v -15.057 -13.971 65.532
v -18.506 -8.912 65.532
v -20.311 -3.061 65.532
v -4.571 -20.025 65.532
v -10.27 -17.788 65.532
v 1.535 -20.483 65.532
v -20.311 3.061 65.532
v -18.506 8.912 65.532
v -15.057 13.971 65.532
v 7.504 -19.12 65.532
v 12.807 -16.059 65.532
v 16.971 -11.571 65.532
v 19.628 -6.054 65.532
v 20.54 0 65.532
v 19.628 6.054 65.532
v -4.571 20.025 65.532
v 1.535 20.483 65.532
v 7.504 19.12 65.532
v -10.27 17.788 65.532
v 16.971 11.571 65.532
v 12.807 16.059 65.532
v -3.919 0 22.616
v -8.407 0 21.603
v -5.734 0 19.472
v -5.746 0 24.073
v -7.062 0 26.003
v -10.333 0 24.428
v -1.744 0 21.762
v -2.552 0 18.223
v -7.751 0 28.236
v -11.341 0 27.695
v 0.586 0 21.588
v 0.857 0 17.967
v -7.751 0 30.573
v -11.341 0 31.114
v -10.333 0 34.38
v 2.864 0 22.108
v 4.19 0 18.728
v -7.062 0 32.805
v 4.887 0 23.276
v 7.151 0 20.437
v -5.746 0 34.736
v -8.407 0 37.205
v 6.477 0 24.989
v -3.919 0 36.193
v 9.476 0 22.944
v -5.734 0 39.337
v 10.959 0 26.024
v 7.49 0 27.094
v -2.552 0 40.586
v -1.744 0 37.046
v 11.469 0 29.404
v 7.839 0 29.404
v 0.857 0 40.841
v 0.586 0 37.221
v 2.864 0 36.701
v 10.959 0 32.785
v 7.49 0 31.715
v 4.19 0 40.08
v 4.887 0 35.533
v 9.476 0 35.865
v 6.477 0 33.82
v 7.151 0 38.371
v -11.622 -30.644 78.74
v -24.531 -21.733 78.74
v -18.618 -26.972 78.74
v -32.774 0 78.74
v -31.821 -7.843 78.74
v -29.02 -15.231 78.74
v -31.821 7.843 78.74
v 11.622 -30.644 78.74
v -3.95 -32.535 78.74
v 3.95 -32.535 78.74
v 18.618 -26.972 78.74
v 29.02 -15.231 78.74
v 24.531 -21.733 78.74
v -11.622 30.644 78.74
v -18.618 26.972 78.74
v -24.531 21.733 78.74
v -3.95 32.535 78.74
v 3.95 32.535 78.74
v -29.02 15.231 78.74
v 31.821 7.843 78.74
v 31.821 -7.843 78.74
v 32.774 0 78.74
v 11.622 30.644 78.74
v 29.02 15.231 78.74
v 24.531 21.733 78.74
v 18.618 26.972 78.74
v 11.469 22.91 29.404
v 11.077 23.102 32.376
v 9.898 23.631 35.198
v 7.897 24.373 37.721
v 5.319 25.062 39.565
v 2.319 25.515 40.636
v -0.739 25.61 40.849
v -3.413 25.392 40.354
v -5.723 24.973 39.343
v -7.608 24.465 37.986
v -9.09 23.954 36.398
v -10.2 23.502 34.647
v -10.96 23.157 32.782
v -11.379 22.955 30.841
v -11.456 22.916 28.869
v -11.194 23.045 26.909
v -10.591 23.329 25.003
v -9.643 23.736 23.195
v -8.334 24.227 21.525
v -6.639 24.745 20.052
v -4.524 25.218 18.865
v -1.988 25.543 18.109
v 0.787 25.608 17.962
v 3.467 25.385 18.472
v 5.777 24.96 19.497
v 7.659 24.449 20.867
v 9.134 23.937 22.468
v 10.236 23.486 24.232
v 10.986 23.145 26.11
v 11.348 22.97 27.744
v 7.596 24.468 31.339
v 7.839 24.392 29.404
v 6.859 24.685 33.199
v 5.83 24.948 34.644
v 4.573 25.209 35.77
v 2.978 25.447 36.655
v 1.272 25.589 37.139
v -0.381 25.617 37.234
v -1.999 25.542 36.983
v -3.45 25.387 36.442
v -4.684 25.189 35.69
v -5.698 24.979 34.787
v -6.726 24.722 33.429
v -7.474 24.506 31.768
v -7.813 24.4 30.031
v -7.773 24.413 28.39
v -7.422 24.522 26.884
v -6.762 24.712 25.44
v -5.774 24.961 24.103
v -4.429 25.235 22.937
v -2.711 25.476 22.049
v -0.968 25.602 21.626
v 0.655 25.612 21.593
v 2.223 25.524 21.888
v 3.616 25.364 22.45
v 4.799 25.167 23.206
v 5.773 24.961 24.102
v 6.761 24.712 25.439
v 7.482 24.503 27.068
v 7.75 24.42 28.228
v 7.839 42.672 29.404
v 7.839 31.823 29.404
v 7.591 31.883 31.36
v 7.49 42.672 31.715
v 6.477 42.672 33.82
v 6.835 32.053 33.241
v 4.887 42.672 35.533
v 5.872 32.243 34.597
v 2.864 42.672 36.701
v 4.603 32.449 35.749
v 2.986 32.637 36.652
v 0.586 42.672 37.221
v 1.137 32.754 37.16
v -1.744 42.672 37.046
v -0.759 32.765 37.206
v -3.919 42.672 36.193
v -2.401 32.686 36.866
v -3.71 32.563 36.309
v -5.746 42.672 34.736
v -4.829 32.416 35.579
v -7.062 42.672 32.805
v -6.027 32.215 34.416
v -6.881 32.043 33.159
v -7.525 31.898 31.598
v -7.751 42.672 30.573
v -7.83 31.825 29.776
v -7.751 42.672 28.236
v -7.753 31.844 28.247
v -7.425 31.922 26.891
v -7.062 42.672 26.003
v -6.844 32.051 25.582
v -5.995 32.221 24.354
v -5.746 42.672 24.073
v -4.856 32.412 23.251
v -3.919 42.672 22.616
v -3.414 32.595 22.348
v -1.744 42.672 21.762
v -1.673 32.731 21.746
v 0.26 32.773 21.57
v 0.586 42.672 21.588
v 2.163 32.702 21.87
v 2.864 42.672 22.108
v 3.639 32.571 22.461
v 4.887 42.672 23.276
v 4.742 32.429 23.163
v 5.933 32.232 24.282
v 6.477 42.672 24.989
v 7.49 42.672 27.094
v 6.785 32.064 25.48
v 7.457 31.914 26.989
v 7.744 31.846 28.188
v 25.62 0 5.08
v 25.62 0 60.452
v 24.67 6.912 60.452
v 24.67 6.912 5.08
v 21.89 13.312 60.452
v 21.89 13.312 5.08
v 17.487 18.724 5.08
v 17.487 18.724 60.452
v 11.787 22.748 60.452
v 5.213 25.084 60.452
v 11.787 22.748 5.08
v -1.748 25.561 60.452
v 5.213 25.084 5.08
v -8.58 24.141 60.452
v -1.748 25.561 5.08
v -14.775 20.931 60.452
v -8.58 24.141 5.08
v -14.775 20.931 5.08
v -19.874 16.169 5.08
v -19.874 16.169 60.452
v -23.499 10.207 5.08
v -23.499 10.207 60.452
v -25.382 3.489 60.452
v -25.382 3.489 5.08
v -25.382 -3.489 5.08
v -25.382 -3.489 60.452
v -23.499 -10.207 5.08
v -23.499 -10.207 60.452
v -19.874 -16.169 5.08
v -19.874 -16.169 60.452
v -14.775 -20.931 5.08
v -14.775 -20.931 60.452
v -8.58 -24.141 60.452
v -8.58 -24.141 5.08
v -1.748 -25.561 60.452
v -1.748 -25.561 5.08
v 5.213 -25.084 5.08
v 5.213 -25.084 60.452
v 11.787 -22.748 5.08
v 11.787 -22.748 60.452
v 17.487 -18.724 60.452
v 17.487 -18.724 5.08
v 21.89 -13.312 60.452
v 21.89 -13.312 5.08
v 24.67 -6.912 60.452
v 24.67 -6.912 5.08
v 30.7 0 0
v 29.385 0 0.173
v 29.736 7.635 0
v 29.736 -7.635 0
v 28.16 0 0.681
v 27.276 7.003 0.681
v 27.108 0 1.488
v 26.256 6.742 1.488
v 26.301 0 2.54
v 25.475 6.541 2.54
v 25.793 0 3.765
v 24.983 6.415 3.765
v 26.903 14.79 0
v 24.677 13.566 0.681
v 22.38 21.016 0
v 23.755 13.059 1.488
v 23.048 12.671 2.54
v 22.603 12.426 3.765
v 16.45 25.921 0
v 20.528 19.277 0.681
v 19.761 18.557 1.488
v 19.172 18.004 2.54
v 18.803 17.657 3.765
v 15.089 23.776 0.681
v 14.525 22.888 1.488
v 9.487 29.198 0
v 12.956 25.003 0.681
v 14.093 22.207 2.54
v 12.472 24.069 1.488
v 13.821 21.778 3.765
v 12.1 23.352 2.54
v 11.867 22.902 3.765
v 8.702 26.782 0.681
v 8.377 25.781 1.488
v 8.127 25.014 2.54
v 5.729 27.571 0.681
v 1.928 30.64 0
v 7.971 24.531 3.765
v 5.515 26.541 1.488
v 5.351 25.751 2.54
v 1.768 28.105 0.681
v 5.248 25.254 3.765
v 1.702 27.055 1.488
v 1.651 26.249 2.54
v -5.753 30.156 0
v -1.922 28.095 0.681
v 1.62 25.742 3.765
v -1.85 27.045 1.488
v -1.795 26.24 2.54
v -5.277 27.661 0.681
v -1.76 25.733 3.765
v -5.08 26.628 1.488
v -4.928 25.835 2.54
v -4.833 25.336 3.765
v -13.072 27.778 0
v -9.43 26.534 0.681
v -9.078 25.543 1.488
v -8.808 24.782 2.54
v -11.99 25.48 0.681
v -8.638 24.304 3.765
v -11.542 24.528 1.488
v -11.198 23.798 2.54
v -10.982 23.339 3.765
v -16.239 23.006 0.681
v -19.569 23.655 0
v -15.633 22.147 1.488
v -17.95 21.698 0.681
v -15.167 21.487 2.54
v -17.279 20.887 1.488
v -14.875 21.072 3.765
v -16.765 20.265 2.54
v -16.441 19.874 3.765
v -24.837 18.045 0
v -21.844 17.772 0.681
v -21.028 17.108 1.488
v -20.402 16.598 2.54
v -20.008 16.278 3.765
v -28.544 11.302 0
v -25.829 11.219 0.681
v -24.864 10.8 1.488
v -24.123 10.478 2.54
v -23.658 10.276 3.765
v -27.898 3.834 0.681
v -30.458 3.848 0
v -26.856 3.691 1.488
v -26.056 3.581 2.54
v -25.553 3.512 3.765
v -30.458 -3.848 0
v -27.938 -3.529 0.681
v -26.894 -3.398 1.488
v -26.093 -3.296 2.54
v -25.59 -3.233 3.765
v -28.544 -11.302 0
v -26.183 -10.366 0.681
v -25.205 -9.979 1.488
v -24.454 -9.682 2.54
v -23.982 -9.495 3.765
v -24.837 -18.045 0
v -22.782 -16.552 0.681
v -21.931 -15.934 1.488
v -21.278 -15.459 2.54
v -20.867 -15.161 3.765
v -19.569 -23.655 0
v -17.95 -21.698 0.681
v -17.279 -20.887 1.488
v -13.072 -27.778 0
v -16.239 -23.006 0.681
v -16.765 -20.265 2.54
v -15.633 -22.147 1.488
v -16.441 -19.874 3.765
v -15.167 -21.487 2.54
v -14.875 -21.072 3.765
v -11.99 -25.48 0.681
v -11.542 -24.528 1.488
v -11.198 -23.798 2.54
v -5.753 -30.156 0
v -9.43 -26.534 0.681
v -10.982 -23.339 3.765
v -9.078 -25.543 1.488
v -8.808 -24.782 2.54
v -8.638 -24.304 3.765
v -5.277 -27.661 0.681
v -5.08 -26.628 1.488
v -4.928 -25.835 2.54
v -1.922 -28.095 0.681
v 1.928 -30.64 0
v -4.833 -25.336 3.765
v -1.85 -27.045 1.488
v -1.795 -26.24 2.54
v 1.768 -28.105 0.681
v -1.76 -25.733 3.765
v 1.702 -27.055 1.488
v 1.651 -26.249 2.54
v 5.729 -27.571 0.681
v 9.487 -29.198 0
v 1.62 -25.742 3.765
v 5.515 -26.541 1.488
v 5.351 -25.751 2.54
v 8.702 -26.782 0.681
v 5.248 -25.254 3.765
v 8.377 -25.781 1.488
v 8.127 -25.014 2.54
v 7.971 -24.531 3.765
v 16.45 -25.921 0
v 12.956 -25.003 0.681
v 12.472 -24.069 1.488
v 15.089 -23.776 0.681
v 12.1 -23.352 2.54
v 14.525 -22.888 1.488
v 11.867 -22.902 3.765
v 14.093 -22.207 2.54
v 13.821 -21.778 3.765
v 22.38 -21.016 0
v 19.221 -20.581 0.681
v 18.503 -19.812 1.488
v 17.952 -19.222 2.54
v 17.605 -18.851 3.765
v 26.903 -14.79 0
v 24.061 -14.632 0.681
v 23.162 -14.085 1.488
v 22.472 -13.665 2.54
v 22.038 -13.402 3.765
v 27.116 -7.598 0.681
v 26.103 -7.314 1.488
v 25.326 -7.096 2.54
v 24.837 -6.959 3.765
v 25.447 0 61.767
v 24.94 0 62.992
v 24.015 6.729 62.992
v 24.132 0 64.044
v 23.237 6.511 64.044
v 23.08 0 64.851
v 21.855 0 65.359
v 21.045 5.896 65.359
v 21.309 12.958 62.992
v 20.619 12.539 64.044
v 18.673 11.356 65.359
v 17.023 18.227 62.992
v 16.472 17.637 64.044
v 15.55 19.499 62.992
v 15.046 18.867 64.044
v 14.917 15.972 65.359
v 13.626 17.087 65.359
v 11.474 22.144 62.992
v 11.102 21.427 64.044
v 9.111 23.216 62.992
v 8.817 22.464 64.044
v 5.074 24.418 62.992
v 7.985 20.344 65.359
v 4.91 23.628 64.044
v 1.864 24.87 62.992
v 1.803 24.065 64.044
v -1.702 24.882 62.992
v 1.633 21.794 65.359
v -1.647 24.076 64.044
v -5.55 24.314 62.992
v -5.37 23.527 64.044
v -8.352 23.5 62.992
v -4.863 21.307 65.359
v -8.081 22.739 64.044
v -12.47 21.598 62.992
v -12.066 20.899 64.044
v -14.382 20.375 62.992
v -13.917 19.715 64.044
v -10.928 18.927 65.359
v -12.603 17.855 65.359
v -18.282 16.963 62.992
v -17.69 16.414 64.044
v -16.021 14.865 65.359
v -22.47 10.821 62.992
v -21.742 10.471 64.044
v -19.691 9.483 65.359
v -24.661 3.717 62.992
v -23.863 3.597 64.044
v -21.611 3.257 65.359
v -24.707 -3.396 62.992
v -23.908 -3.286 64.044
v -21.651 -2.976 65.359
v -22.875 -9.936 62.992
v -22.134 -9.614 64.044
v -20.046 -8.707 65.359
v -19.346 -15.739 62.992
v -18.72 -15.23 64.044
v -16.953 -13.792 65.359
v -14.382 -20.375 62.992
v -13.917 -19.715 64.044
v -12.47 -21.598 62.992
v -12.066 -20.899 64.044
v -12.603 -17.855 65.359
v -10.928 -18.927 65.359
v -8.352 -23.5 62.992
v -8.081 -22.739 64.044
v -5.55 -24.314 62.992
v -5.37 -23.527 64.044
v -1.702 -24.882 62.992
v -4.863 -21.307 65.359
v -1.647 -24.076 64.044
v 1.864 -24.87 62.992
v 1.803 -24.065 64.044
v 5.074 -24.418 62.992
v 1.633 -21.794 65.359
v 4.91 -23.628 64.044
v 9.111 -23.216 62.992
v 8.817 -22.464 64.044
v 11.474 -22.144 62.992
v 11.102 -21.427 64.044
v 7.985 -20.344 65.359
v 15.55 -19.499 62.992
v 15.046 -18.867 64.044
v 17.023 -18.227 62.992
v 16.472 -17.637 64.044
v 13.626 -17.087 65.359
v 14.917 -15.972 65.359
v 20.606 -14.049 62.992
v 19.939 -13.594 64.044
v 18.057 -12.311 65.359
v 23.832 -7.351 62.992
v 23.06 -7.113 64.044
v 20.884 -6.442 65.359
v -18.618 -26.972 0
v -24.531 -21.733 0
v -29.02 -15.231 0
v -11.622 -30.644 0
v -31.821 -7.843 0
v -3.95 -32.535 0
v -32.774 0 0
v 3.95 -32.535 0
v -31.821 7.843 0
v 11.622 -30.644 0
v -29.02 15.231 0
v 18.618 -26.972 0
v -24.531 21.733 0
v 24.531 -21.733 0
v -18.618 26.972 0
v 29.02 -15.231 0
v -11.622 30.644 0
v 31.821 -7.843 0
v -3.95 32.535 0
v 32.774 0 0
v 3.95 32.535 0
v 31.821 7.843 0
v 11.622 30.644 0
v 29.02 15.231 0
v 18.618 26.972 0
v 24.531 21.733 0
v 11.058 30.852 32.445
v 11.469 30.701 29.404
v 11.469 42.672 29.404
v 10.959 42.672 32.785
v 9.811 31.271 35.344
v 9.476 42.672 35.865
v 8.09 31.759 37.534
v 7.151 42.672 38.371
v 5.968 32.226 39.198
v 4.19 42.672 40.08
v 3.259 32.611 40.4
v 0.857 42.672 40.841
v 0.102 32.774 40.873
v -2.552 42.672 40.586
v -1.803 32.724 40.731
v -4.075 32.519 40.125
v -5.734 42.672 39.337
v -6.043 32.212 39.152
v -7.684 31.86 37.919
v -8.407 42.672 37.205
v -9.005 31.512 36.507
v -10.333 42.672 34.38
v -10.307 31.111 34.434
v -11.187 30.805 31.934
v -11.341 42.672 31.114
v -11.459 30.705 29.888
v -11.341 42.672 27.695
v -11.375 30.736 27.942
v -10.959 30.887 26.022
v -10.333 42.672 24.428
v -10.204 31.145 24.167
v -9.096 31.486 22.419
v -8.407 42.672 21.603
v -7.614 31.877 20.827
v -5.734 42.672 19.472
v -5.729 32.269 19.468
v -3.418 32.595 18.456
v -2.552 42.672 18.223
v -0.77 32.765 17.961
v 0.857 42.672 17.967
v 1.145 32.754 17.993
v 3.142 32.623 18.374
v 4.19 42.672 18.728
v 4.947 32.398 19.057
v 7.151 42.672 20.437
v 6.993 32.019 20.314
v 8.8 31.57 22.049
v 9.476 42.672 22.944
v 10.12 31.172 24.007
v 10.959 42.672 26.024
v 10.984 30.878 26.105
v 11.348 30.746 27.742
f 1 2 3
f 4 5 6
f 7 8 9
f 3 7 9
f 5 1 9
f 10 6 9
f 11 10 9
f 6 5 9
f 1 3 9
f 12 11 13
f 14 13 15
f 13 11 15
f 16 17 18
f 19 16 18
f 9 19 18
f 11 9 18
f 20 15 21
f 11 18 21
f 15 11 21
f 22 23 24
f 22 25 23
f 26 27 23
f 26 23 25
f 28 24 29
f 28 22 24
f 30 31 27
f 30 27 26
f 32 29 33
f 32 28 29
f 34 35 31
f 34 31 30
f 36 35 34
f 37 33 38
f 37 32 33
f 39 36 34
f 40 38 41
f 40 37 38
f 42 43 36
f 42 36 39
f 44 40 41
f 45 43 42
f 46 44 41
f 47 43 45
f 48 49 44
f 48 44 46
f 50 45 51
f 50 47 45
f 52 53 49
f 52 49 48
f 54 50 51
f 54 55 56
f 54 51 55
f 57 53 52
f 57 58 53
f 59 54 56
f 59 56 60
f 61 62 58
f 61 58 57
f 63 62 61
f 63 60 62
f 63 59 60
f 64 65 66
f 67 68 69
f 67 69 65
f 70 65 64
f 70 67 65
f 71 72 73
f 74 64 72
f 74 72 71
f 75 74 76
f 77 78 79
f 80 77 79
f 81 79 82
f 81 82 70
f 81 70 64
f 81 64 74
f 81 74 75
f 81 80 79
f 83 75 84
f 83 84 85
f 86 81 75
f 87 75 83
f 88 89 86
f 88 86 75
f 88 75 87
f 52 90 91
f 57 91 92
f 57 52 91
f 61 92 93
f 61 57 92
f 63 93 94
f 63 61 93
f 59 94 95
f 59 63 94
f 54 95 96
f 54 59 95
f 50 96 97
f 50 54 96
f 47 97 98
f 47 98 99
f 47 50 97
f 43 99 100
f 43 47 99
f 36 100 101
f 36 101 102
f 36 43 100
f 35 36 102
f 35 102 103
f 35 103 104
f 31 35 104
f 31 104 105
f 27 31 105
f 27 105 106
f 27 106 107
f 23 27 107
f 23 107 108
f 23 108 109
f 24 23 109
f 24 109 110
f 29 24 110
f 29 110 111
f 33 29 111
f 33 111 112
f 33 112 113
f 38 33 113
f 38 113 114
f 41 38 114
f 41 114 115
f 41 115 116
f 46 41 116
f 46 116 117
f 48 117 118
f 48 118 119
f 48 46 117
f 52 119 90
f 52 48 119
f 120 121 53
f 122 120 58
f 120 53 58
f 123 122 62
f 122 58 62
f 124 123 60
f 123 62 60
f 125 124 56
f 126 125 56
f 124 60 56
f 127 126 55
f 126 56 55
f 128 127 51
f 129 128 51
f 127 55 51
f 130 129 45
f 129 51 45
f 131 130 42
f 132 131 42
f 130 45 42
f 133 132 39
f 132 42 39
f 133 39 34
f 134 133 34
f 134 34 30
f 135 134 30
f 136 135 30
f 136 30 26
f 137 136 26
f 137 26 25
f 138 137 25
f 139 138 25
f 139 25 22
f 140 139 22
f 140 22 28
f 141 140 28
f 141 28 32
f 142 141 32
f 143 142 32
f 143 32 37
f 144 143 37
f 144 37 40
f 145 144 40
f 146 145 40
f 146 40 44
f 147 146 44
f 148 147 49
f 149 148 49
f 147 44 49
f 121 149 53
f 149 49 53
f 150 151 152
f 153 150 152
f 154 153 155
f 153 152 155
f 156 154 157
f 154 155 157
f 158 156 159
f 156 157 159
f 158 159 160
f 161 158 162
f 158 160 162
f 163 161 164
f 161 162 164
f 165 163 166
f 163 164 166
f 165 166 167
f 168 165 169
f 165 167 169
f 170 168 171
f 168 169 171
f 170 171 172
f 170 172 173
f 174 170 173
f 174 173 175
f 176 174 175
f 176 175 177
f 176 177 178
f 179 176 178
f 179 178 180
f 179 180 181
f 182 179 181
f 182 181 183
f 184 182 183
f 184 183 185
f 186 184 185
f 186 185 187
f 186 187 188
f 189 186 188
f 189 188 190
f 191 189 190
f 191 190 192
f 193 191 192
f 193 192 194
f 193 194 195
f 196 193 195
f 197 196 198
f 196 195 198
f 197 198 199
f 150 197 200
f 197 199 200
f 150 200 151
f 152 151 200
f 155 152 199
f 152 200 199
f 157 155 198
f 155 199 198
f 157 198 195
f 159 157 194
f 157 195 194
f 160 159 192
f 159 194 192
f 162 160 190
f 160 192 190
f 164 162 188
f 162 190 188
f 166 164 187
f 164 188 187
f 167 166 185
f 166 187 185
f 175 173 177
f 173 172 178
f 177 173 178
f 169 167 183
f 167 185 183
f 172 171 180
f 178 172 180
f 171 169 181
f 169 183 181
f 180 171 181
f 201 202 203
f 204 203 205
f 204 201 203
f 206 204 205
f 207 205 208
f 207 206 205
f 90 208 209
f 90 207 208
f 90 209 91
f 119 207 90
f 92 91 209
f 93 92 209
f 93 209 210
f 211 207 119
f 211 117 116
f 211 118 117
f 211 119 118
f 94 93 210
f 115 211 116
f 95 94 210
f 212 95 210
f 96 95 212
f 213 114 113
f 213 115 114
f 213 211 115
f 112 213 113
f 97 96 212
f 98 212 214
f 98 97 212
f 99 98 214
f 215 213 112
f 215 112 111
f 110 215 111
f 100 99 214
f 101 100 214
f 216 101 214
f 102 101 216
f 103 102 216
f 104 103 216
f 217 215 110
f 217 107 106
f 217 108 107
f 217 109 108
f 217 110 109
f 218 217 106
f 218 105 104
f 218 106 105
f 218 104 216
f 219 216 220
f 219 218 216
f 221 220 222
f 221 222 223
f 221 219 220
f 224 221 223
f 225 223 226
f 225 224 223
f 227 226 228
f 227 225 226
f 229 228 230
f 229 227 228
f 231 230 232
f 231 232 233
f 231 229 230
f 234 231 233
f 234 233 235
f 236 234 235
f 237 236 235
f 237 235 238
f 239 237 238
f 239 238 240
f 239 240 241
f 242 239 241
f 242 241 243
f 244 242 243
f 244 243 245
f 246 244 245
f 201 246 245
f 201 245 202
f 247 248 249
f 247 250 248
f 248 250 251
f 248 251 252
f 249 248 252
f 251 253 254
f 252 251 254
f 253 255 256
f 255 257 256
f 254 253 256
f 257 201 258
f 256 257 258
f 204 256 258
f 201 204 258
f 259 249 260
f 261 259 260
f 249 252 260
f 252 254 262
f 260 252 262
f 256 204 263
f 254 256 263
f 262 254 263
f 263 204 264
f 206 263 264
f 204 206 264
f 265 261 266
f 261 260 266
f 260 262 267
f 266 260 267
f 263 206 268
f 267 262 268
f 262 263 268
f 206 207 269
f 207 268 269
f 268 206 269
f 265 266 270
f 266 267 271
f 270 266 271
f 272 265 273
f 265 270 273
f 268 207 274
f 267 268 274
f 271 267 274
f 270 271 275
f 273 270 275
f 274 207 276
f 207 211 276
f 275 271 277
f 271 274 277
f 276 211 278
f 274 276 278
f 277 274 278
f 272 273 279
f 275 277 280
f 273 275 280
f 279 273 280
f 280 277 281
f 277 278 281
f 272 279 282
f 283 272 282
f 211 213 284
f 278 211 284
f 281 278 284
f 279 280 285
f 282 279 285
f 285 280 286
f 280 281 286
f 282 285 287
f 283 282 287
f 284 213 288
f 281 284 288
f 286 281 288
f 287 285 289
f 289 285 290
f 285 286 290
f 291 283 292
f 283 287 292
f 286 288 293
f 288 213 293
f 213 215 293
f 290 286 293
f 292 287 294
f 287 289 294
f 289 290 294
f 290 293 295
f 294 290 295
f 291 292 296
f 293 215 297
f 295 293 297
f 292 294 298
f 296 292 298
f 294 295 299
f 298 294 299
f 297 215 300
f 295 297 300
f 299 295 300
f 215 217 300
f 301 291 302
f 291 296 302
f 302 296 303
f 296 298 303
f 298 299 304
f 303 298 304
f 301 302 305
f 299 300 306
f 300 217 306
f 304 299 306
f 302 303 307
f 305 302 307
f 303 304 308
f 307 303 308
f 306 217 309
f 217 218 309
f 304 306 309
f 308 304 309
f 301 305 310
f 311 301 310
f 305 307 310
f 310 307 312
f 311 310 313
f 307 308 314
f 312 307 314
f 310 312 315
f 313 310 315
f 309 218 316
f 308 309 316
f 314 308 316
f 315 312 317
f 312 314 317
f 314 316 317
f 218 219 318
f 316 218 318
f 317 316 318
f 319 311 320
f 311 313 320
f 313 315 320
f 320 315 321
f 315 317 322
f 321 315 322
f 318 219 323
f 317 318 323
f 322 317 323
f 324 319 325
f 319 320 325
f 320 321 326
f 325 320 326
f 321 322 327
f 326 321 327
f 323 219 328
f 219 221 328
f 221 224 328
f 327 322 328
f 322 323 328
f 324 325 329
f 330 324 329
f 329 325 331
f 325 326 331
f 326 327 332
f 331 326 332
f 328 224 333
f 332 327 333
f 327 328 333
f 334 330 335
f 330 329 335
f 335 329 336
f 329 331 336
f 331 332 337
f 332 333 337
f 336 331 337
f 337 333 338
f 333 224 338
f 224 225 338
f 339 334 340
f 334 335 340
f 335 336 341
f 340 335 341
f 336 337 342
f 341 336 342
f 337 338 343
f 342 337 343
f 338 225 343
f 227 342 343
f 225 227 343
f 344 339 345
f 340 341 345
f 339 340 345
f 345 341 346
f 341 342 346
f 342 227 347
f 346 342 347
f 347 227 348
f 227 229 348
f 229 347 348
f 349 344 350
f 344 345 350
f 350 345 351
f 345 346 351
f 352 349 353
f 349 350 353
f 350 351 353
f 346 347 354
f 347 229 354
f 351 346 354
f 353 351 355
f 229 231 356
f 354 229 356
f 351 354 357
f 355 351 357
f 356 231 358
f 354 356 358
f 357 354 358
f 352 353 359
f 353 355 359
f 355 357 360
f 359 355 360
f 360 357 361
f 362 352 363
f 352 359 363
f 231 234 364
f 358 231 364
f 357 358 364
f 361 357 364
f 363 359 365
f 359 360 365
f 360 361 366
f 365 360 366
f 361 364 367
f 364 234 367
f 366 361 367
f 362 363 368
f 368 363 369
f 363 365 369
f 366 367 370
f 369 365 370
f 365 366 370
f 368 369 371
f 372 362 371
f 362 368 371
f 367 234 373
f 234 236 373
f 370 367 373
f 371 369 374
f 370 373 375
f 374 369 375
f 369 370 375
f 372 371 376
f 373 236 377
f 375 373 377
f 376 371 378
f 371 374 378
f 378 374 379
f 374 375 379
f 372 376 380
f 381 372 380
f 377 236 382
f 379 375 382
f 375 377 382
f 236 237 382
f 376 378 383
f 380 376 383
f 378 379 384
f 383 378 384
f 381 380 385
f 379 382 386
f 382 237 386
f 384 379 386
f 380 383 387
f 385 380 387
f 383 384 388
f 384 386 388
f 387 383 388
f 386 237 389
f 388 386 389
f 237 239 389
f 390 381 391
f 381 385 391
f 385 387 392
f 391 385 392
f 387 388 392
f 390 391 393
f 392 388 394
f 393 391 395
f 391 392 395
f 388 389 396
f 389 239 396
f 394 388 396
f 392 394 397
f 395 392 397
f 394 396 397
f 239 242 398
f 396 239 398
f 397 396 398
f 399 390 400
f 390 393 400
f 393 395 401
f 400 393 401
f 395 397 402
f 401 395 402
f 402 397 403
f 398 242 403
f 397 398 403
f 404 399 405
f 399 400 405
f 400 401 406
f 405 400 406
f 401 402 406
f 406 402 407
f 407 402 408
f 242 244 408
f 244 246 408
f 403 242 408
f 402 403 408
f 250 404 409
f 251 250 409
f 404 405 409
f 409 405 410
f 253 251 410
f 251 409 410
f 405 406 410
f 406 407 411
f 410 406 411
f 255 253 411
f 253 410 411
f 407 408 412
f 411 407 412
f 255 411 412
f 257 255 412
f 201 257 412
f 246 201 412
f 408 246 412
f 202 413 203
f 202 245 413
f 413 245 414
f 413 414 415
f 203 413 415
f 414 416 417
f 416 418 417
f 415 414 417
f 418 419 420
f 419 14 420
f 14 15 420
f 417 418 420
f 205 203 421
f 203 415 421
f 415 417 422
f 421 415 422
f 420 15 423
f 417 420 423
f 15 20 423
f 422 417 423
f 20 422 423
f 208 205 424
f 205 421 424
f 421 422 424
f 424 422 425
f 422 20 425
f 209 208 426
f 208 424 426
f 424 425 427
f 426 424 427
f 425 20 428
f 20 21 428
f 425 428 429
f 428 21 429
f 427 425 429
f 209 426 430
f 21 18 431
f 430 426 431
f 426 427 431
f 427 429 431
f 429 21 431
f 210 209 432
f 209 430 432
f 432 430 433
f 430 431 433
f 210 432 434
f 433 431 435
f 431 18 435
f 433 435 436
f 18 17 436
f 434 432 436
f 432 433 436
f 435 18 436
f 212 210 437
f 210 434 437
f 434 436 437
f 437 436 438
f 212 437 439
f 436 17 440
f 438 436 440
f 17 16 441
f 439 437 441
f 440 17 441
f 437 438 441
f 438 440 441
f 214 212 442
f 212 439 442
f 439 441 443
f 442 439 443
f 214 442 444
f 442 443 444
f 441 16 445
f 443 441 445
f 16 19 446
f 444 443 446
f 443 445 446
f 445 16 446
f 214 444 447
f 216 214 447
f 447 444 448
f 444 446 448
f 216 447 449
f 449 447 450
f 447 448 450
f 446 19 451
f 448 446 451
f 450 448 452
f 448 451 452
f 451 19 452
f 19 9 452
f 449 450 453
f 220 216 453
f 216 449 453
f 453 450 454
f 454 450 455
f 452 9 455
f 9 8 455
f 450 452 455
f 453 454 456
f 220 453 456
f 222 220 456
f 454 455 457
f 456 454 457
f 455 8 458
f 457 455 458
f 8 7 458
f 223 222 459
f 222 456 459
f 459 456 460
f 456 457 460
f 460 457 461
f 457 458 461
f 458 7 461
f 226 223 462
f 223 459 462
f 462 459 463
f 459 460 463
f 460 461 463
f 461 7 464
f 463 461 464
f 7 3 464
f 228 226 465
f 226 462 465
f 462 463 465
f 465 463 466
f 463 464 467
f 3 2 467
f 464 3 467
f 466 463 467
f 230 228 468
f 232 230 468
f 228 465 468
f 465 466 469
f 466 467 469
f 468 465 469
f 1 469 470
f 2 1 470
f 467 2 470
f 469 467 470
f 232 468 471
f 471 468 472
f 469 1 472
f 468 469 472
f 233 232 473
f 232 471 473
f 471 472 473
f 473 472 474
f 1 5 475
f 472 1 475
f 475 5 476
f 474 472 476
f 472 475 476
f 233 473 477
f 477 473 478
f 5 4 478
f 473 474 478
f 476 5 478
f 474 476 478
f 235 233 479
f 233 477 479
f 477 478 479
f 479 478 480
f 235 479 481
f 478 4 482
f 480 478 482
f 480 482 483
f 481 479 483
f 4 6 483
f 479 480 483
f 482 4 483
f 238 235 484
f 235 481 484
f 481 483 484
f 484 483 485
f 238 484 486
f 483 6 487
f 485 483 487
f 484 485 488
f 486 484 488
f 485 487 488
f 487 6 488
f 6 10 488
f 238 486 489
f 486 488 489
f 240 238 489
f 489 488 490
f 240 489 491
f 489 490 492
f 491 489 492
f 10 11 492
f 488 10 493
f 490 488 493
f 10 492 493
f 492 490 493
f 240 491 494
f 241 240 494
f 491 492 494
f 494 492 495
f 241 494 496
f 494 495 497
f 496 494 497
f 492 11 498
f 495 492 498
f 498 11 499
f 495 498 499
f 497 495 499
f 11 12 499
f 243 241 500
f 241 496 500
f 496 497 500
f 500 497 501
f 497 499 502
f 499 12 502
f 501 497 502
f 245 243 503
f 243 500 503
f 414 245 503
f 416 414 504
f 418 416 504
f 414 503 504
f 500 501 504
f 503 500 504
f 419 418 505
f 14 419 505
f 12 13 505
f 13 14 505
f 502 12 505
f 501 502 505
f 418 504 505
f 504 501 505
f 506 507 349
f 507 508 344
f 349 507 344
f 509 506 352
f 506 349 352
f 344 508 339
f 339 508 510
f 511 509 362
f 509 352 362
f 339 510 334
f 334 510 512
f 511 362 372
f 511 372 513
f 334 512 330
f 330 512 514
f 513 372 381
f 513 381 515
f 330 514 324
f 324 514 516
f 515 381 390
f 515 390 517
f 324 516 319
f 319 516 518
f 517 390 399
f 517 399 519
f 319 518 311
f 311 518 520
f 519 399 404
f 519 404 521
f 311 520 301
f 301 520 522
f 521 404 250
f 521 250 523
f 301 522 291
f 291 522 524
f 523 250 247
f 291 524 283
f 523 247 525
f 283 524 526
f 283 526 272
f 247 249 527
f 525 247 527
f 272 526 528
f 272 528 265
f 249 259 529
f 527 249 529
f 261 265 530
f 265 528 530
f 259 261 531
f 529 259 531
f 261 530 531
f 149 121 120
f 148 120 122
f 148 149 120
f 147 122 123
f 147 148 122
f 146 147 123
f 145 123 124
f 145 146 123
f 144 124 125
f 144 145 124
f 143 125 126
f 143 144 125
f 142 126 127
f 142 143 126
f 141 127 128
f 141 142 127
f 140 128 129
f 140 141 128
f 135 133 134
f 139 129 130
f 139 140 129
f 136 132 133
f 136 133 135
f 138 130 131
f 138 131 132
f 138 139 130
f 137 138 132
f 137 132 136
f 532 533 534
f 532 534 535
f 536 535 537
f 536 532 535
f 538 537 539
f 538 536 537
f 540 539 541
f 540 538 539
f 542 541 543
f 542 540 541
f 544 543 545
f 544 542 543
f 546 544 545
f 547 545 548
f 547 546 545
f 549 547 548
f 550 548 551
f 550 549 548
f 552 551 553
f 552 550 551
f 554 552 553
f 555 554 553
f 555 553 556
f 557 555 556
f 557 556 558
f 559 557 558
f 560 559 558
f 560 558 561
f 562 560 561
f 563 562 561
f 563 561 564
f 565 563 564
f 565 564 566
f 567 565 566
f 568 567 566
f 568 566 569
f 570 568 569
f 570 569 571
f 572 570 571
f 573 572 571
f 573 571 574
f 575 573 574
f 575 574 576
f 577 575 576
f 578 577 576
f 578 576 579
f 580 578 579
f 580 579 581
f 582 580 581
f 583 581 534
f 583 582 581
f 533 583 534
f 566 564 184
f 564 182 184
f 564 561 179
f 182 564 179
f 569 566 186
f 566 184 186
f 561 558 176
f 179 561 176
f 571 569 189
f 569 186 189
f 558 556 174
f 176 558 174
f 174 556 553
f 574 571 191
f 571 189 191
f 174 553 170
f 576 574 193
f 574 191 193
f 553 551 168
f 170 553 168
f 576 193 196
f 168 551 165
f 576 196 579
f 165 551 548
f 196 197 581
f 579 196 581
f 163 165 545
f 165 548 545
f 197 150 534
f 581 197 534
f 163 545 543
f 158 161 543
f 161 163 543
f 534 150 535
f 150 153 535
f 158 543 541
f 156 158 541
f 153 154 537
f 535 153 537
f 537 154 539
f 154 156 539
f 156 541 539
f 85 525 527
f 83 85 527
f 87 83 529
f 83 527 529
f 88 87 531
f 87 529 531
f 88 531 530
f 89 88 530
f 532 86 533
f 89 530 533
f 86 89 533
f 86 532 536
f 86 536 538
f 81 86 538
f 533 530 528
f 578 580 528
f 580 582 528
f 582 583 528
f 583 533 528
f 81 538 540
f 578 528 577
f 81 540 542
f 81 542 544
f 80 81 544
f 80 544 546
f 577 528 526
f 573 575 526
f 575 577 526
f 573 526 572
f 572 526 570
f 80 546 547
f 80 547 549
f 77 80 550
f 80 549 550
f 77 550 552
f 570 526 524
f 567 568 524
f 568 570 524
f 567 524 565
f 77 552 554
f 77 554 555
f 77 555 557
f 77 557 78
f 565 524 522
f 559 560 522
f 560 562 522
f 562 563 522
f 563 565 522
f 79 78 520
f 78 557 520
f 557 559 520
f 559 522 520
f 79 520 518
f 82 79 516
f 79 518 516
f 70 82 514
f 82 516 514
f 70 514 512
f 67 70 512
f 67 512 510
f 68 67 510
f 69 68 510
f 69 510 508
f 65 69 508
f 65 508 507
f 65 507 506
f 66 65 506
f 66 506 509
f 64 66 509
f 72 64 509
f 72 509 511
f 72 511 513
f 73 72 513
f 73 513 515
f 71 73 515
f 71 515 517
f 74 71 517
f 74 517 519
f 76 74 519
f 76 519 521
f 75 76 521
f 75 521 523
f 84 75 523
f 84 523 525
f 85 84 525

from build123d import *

# Parameters (mm, degrees)
F0_R     = 32.773688
F1_DEPTH = 78.74
F2_R     = 25.62025
F3_DEPTH = 65.532
F4_R     = 5.08
F5_R     = 11.468996
F5_R_2   = 7.838538
F6_DEPTH = 42.672


with BuildPart() as f1:
    # F0 (on Top) → F1 (new body)
    with BuildSketch(Plane.XY):
        Circle(F0_R)
    extrude(amount=F1_DEPTH)

    # F2 (on Top) → F3 (cut)
    with BuildSketch(Plane.XY):
        Circle(F2_R)
    extrude(amount=F3_DEPTH, mode=Mode.SUBTRACT)

    # F4
    f4_edges = [f1.edges().sort_by_distance(p)[0] for p in [
        (-25.62025, 0, 0),
        (-25.62025, 0, 65.532),
    ]]
    fillet(f4_edges, radius=F4_R)

    # F5 (on Front) → F6 (join)
    with BuildSketch(Plane.XZ):
        with Locations((0, 29.404234)):
            Circle(F5_R)
        with Locations((0, 29.404234)):
            Circle(F5_R_2, mode=Mode.SUBTRACT)
    extrude(amount=-F6_DEPTH)


solid = f1.part
